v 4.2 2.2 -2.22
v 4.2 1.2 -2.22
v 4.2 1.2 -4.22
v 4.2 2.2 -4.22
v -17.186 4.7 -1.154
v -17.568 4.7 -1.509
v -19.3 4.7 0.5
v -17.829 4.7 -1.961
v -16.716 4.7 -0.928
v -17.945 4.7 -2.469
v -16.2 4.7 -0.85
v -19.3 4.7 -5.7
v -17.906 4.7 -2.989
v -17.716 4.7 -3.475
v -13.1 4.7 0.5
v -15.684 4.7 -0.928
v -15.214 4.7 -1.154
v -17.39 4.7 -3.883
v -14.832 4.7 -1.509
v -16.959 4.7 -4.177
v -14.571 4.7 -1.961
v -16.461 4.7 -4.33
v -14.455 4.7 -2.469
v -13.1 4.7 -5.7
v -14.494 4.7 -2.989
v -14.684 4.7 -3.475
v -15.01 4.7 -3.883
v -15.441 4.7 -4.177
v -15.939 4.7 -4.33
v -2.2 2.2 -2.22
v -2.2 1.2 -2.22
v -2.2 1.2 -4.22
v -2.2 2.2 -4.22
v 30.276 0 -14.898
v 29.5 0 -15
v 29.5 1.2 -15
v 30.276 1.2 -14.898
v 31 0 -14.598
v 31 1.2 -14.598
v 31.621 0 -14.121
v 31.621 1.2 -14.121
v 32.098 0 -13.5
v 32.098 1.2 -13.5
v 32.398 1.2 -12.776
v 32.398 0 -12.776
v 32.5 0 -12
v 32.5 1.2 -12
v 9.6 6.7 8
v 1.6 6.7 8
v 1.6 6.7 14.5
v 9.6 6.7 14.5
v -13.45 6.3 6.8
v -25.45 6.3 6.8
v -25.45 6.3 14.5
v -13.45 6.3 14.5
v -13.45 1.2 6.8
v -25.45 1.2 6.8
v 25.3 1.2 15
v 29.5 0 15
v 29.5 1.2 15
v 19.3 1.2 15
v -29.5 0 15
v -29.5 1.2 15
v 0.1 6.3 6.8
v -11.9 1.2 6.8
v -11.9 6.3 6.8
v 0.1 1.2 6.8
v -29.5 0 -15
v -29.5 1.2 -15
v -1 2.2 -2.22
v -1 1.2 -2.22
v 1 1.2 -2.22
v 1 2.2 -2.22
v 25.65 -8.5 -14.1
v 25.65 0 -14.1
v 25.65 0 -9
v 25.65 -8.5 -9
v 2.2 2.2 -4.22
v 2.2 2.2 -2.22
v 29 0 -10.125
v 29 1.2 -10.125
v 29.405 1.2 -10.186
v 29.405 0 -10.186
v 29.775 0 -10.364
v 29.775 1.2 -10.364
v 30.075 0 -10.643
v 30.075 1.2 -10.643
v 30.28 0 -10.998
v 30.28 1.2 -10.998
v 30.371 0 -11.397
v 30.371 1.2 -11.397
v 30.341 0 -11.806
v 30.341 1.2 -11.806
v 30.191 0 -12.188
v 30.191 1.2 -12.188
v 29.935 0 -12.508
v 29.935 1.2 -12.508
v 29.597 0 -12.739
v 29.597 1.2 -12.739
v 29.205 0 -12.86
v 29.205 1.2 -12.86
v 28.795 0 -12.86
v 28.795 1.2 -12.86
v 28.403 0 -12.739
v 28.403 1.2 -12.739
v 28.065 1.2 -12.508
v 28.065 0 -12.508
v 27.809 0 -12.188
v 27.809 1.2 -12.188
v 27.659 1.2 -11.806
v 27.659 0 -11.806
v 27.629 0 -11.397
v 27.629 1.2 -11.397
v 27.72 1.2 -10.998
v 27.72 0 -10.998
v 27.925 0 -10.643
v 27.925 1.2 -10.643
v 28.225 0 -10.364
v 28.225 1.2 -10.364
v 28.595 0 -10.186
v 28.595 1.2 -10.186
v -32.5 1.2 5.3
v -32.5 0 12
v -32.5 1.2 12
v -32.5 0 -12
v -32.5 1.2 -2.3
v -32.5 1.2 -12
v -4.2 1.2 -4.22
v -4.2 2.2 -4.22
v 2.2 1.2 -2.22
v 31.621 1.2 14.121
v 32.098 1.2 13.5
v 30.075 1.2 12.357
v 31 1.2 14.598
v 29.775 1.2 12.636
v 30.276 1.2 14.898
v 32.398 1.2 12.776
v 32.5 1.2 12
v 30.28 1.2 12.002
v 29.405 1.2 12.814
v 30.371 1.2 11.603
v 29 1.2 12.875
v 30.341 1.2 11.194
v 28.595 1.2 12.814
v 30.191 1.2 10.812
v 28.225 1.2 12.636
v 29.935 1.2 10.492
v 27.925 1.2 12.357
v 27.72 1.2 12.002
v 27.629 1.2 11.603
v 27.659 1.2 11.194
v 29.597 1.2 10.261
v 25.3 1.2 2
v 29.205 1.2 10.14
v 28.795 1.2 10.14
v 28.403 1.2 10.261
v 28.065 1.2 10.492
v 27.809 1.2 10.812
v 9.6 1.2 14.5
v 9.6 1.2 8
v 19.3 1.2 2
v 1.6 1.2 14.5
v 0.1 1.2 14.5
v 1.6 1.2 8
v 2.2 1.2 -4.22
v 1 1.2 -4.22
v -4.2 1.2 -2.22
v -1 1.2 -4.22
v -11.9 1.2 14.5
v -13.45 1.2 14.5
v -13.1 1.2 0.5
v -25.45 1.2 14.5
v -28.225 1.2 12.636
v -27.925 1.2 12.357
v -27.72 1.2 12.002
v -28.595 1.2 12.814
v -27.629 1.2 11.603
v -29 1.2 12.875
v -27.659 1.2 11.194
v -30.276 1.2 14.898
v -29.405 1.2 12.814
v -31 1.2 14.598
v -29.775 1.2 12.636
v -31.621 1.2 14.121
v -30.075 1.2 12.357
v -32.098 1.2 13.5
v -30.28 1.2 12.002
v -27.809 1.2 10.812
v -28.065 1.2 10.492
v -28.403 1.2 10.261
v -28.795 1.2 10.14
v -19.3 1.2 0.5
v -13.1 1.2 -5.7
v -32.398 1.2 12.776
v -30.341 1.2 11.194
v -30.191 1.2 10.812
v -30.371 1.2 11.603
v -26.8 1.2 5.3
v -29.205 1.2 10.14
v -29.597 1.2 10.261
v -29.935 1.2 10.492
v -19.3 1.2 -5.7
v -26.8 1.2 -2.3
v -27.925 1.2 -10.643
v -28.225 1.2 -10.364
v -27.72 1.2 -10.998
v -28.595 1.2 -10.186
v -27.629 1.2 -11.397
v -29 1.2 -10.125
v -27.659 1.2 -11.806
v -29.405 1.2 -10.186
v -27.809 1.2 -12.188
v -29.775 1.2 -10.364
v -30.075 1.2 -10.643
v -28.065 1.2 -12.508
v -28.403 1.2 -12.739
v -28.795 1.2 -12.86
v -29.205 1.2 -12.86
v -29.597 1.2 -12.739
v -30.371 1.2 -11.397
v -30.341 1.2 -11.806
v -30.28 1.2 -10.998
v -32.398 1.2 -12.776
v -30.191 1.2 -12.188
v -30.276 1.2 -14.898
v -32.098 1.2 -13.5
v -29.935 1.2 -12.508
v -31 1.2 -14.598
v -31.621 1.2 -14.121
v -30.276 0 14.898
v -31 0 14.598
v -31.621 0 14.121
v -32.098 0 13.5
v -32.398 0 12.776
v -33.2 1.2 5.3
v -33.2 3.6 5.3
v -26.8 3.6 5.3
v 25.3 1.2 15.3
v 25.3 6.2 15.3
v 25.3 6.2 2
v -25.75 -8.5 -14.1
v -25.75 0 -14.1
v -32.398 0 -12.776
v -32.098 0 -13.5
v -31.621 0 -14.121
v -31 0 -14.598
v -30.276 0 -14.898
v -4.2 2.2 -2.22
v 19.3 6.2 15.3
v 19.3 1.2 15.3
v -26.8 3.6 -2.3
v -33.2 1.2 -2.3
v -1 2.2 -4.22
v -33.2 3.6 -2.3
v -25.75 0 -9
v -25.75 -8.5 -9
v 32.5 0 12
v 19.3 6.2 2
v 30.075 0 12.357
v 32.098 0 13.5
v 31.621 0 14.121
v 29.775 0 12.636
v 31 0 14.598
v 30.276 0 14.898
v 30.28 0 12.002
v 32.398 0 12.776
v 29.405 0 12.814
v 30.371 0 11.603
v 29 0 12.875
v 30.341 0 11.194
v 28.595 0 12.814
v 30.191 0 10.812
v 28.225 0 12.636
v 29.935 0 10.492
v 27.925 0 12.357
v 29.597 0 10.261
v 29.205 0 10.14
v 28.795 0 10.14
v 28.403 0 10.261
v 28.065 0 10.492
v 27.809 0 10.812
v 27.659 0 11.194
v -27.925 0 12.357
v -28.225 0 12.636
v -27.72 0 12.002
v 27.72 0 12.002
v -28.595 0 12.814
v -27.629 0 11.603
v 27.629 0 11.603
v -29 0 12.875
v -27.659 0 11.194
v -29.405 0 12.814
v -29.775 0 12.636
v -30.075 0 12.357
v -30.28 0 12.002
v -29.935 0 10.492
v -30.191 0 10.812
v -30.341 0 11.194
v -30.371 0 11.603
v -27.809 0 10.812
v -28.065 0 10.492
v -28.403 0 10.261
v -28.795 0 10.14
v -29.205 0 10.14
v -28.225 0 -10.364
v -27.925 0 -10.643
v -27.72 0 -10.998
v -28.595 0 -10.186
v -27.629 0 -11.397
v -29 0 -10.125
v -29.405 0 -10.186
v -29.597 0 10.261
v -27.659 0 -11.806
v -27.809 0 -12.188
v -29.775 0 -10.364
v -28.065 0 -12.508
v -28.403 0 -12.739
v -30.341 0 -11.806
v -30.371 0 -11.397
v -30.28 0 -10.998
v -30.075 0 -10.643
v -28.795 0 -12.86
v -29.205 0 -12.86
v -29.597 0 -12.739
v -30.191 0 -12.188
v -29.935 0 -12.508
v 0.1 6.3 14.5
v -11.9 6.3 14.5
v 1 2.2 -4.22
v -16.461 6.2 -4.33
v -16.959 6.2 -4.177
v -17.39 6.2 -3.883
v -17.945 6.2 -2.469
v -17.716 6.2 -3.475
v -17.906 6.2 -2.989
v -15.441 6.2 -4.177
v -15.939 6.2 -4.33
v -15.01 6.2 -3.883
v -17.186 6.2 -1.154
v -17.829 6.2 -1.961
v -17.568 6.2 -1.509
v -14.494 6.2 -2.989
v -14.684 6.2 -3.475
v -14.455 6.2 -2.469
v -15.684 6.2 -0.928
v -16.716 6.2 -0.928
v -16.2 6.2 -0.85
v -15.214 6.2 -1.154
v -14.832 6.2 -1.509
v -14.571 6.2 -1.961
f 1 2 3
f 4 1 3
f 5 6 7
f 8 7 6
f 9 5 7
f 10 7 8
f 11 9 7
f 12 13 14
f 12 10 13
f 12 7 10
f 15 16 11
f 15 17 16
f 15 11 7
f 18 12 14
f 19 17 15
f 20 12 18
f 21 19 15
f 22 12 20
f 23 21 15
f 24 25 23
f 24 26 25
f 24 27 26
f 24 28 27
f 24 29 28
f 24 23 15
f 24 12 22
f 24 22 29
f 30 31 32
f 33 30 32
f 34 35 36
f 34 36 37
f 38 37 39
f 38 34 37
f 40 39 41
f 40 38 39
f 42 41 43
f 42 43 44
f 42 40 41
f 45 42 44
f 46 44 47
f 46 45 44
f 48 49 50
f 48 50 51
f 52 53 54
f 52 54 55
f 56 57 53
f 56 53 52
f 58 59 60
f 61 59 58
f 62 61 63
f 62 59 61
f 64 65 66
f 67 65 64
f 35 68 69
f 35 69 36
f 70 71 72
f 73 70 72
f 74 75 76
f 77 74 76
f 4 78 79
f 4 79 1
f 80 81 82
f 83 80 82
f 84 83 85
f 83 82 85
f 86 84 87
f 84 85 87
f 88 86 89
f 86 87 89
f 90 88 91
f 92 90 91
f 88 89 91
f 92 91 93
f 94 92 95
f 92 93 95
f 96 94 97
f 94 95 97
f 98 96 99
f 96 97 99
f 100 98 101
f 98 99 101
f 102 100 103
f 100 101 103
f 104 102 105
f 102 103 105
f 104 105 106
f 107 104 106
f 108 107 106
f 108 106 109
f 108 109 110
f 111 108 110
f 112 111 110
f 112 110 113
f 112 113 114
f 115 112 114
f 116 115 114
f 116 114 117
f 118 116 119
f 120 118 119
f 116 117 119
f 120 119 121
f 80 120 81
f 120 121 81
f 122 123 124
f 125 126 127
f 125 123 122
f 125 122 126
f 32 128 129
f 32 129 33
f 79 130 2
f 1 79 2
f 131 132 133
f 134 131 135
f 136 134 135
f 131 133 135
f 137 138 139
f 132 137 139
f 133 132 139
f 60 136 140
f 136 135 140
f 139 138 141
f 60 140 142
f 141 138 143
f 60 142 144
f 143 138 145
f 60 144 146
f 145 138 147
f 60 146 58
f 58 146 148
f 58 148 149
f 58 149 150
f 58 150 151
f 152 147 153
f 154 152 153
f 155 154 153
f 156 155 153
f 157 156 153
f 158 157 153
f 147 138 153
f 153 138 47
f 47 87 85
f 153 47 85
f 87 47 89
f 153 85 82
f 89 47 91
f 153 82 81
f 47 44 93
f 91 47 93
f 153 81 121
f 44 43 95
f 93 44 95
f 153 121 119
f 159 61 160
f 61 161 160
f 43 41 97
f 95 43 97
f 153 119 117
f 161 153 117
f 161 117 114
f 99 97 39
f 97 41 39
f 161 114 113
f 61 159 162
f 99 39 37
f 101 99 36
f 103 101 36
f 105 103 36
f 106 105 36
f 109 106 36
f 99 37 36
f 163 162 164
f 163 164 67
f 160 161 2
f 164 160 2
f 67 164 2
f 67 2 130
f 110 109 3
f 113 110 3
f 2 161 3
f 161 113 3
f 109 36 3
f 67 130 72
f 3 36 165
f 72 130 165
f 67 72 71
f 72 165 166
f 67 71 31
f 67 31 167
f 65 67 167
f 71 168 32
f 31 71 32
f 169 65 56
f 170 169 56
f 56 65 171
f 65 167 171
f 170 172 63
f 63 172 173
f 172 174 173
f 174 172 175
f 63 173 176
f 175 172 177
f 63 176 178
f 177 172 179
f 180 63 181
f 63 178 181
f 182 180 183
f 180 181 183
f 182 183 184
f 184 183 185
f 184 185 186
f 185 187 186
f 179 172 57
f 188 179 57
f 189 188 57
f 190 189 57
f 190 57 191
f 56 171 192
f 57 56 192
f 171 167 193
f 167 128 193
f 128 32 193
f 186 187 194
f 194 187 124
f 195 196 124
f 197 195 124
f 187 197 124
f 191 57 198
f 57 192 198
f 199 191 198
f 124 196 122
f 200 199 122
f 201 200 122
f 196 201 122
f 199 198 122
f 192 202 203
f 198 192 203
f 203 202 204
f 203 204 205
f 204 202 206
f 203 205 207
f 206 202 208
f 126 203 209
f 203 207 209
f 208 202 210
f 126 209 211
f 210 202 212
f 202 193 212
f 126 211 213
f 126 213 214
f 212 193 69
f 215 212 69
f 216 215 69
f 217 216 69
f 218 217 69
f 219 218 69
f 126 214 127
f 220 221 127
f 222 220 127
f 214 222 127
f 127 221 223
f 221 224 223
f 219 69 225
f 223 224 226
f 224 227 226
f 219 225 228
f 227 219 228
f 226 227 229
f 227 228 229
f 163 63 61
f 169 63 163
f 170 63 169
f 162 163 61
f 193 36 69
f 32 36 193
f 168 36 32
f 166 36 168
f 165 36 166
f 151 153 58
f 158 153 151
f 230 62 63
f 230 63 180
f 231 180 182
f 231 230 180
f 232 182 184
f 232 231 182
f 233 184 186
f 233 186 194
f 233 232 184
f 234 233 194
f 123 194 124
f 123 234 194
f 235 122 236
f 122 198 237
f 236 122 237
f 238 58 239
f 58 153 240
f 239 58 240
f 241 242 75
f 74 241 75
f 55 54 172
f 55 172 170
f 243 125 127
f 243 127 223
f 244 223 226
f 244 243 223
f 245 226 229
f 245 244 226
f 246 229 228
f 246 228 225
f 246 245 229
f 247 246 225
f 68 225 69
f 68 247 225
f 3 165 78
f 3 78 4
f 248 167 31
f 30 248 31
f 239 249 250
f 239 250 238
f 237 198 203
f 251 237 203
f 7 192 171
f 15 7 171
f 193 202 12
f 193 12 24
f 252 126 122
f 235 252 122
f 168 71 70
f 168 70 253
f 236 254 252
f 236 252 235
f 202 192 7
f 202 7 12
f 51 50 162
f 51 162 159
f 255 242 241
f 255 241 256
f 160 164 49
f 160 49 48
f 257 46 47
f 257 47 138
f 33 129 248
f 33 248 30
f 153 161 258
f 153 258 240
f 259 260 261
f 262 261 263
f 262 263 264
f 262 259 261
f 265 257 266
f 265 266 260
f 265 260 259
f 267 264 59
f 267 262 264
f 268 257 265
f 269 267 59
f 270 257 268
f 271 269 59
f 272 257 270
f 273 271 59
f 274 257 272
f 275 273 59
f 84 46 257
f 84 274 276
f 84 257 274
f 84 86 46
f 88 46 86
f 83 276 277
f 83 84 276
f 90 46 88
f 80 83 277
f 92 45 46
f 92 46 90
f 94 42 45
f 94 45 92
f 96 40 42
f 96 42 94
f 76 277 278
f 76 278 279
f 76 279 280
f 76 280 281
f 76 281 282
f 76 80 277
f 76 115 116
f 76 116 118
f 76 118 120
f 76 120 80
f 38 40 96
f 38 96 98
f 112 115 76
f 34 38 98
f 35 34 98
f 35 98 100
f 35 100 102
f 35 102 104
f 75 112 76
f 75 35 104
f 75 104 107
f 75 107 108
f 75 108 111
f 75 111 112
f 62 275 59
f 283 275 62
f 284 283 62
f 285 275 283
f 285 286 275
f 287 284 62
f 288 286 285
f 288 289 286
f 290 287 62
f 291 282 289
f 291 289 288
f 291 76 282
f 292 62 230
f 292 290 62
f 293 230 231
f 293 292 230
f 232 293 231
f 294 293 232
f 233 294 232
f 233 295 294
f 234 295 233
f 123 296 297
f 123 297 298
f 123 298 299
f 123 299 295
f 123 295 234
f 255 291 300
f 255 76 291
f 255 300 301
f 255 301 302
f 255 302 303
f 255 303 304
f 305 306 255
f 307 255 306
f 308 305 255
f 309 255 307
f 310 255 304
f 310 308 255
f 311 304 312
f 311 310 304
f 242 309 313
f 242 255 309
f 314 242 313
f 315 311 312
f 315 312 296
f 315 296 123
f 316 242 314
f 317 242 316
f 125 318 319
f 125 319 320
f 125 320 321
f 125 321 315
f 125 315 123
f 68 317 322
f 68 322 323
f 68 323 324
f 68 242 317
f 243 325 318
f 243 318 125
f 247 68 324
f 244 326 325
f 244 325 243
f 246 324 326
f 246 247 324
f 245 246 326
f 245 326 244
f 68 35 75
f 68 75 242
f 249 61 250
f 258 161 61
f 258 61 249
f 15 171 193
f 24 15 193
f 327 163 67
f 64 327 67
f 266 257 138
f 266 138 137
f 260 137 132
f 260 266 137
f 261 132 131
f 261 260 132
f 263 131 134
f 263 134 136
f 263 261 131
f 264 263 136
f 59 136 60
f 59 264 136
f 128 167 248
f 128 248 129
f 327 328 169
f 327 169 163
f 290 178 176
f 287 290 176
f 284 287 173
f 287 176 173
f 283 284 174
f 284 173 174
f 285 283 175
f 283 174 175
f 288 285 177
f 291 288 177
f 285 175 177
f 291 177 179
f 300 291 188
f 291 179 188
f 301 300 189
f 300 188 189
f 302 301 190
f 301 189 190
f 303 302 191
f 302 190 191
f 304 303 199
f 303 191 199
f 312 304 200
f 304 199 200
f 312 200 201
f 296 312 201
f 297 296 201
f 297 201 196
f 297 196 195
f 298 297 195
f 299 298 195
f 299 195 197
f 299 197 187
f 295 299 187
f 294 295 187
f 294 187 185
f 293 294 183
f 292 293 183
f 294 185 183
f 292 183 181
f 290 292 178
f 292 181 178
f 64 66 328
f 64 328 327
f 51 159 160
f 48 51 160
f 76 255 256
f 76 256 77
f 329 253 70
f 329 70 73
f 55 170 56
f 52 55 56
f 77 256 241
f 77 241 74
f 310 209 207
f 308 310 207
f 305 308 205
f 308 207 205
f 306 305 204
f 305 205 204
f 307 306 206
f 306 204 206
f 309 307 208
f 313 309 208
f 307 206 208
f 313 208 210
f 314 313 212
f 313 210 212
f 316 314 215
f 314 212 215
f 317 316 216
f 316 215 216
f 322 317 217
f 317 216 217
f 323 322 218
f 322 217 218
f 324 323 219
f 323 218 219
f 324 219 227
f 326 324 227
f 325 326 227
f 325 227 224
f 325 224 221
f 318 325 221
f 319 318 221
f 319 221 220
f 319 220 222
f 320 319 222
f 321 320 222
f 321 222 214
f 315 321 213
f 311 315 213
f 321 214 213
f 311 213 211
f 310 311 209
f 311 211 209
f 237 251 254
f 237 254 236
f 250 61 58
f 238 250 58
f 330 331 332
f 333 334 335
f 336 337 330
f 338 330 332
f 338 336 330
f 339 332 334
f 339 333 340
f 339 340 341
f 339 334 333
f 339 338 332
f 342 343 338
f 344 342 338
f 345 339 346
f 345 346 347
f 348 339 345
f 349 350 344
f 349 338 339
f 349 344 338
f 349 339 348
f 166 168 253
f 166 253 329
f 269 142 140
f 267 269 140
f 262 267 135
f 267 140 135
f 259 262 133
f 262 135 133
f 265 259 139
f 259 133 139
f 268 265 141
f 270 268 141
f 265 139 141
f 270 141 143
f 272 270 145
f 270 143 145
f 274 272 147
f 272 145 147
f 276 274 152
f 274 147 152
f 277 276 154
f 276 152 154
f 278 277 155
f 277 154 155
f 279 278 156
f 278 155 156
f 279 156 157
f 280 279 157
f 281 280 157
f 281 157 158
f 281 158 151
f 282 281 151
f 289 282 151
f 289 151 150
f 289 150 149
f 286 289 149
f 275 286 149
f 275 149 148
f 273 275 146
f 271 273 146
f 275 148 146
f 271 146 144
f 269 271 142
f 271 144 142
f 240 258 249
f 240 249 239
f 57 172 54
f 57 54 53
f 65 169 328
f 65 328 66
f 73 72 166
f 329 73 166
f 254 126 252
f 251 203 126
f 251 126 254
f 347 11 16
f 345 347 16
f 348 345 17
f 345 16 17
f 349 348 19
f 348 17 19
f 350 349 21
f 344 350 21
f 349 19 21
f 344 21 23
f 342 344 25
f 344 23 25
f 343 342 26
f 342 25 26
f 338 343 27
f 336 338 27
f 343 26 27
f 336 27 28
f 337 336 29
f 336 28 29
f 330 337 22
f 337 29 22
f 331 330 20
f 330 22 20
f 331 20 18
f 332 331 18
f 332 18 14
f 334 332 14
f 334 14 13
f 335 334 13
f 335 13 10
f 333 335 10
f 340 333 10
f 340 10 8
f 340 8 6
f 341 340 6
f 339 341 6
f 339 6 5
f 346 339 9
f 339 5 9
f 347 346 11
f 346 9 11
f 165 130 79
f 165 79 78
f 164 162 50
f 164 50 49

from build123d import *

# Parameters (mm, degrees)
EXTRUDE_1_DEPTH     = 1.2
SKETCH_2_R          = 1.375
CUT_EXTRUDE_1_DEPTH = 1.2
SKETCH_3_W          = 6
SKETCH_3_H          = 13
EXTRUDE_2_DEPTH     = 5
SKETCH_4_W          = 6
SKETCH_4_H          = 5
EXTRUDE_3_DEPTH     = 0.3
SKETCH_5_W          = 8
SKETCH_5_H          = 7
EXTRUDE_4_DEPTH     = 5.5
SKETCH_6_W          = 12
SKETCH_6_H          = 8.2
EXTRUDE_5_DEPTH     = 5.1
SKETCH_7_W          = 12
SKETCH_7_H          = 8.2
EXTRUDE_6_DEPTH     = 5.1
SKETCH_8_W          = 5.7
SKETCH_8_H          = 7.6
EXTRUDE_7_DEPTH     = 2.4
SKETCH_9_W          = 7.6
SKETCH_9_H          = 2.4
EXTRUDE_8_DEPTH     = 0.7
SKETCH_10_W         = 12
SKETCH_10_H         = 5.1
SKETCH_10_W_2       = 8
SKETCH_10_H_2       = 5.5
CUT_EXTRUDE_2_DEPTH = 0.5
SKETCH_11_W         = 51.4
SKETCH_11_H         = 5.1
EXTRUDE_9_DEPTH     = 8.5
SKETCH_12_W         = 6.2
SKETCH_12_H         = 6.2
EXTRUDE_10_DEPTH    = 3.5
SKETCH_13_R         = 1.75
EXTRUDE_11_DEPTH    = 1.5
SKETCH_14_W         = 2
SKETCH_14_H         = 2
EXTRUDE_12_DEPTH    = 1


with BuildPart() as part:
    # 草图1 → 凸台-拉伸1 (new body)
    with BuildSketch(Plane(origin=(0, 0, 0), x_dir=(1, 0, 0), z_dir=(0, 1, 0))):
        with BuildLine():
            Line((-29.5, 15), (29.5, 15))
            ThreePointArc((29.5, 15), (31.621320344, 14.121320344), (32.5, 12))
            Line((32.5, 12), (32.5, -12))
            ThreePointArc((32.5, -12), (31.621320344, -14.121320344), (29.5, -15))
            Line((29.5, -15), (-29.5, -15))
            ThreePointArc((-29.5, -15), (-31.621320344, -14.121320344), (-32.5, -12))
            Line((-32.5, -12), (-32.5, 12))
            ThreePointArc((-32.5, 12), (-31.621320344, 14.121320344), (-29.5, 15))
        make_face()
    extrude(amount=EXTRUDE_1_DEPTH)

    # 草图2 → 切除-拉伸1 (cut)
    with BuildSketch(Plane(origin=(0, 1.2, 0), x_dir=(1, 0, 0), z_dir=(0, 1, 0))):
        with Locations(Location((29, -11.5, 0), (0, 0, 270))):
            Circle(SKETCH_2_R)
        with Locations(Location((29, 11.5, 0), (0, 0, 270))):
            Circle(SKETCH_2_R)
        with Locations(Location((-29, -11.5, 0), (0, 0, 270))):
            Circle(SKETCH_2_R)
        with Locations(Location((-29, 11.5, 0), (0, 0, 270))):
            Circle(SKETCH_2_R)
    extrude(amount=-CUT_EXTRUDE_1_DEPTH, mode=Mode.SUBTRACT)

    # 草图3 → 凸台-拉伸2 (add)
    with BuildSketch(Plane(origin=(0, 1.2, 0), x_dir=(1, 0, 0), z_dir=(0, 1, 0))):
        with Locations((22.3, -8.5)):
            Rectangle(SKETCH_3_W, SKETCH_3_H)
    extrude(amount=EXTRUDE_2_DEPTH)

    # 草图4 → 凸台-拉伸3 (add)
    with BuildSketch(Plane.XY.offset(15)):
        with Locations((22.3, 3.7)):
            Rectangle(SKETCH_4_W, SKETCH_4_H)
    extrude(amount=EXTRUDE_3_DEPTH)

    # 草图5 → 凸台-拉伸4 (add)
    with BuildSketch(Plane(origin=(0, 1.2, 0), x_dir=(1, 0, 0), z_dir=(0, 1, 0))):
        with Locations((5.6, -11.5)):
            Rectangle(SKETCH_5_W, SKETCH_5_H)
    extrude(amount=EXTRUDE_4_DEPTH)

    # 草图6 → 凸台-拉伸5 (add)
    with BuildSketch(Plane(origin=(0, 1.2, 0), x_dir=(1, 0, 0), z_dir=(0, 1, 0))):
        with Locations((-5.9, -10.9)):
            Rectangle(SKETCH_6_W, SKETCH_6_H)
    extrude(amount=EXTRUDE_5_DEPTH)

    # 草图7 → 凸台-拉伸6 (add)
    with BuildSketch(Plane(origin=(0, 1.2, 0), x_dir=(1, 0, 0), z_dir=(0, 1, 0))):
        with Locations((-19.45, -10.9)):
            Rectangle(SKETCH_7_W, SKETCH_7_H)
    extrude(amount=EXTRUDE_6_DEPTH)

    # 草图8 → 凸台-拉伸7 (add)
    with BuildSketch(Plane(origin=(0, 1.2, 0), x_dir=(1, 0, 0), z_dir=(0, 1, 0))):
        with Locations((-29.65, -1.5)):
            Rectangle(SKETCH_8_W, SKETCH_8_H)
    extrude(amount=EXTRUDE_7_DEPTH)

    # 草图9 → 凸台-拉伸8 (add)
    with BuildSketch(Plane.ZY.offset(32.5)):
        with Locations((1.5, 2.4)):
            Rectangle(SKETCH_9_W, SKETCH_9_H)
    extrude(amount=EXTRUDE_8_DEPTH)

    # 草图10 → 切除-拉伸2 (cut)
    with BuildSketch(Plane.XY.offset(15)):
        with Locations((-19.45, 3.75)):
            Rectangle(SKETCH_10_W, SKETCH_10_H)
        with Locations((-5.9, 3.75)):
            Rectangle(SKETCH_10_W, SKETCH_10_H)
        with Locations((5.6, 3.95)):
            Rectangle(SKETCH_10_W_2, SKETCH_10_H_2)
    extrude(amount=-CUT_EXTRUDE_2_DEPTH, mode=Mode.SUBTRACT)

    # 草图11 → 凸台-拉伸9 (add)
    with BuildSketch(Plane.XZ):
        with Locations((-0.05, -11.55)):
            Rectangle(SKETCH_11_W, SKETCH_11_H)
    extrude(amount=EXTRUDE_9_DEPTH)

    # 草图12 → 凸台-拉伸10 (add)
    with BuildSketch(Plane(origin=(0, 1.2, 0), x_dir=(1, 0, 0), z_dir=(0, 1, 0))):
        with Locations((-16.2, 2.6)):
            Rectangle(SKETCH_12_W, SKETCH_12_H)
    extrude(amount=EXTRUDE_10_DEPTH)

    # 草图13 → 凸台-拉伸11 (add)
    with BuildSketch(Plane(origin=(0, 4.7, 0), x_dir=(1, 0, 0), z_dir=(0, 1, 0))):
        with Locations(Location((-16.2, 2.6, 0), (0, 0, 270))):
            Circle(SKETCH_13_R)
    extrude(amount=EXTRUDE_11_DEPTH)

    # 草图14 → 凸台-拉伸12 (add)
    with BuildSketch(Plane(origin=(0, 1.2, 0), x_dir=(1, 0, 0), z_dir=(0, 1, 0))):
        with Locations((3.2, 3.22)):
            Rectangle(SKETCH_14_W, SKETCH_14_H)
        with Locations((0, 3.22)):
            Rectangle(SKETCH_14_W, SKETCH_14_H)
        with Locations((-3.2, 3.22)):
            Rectangle(SKETCH_14_W, SKETCH_14_H)
    extrude(amount=EXTRUDE_12_DEPTH)


solid = part.part
